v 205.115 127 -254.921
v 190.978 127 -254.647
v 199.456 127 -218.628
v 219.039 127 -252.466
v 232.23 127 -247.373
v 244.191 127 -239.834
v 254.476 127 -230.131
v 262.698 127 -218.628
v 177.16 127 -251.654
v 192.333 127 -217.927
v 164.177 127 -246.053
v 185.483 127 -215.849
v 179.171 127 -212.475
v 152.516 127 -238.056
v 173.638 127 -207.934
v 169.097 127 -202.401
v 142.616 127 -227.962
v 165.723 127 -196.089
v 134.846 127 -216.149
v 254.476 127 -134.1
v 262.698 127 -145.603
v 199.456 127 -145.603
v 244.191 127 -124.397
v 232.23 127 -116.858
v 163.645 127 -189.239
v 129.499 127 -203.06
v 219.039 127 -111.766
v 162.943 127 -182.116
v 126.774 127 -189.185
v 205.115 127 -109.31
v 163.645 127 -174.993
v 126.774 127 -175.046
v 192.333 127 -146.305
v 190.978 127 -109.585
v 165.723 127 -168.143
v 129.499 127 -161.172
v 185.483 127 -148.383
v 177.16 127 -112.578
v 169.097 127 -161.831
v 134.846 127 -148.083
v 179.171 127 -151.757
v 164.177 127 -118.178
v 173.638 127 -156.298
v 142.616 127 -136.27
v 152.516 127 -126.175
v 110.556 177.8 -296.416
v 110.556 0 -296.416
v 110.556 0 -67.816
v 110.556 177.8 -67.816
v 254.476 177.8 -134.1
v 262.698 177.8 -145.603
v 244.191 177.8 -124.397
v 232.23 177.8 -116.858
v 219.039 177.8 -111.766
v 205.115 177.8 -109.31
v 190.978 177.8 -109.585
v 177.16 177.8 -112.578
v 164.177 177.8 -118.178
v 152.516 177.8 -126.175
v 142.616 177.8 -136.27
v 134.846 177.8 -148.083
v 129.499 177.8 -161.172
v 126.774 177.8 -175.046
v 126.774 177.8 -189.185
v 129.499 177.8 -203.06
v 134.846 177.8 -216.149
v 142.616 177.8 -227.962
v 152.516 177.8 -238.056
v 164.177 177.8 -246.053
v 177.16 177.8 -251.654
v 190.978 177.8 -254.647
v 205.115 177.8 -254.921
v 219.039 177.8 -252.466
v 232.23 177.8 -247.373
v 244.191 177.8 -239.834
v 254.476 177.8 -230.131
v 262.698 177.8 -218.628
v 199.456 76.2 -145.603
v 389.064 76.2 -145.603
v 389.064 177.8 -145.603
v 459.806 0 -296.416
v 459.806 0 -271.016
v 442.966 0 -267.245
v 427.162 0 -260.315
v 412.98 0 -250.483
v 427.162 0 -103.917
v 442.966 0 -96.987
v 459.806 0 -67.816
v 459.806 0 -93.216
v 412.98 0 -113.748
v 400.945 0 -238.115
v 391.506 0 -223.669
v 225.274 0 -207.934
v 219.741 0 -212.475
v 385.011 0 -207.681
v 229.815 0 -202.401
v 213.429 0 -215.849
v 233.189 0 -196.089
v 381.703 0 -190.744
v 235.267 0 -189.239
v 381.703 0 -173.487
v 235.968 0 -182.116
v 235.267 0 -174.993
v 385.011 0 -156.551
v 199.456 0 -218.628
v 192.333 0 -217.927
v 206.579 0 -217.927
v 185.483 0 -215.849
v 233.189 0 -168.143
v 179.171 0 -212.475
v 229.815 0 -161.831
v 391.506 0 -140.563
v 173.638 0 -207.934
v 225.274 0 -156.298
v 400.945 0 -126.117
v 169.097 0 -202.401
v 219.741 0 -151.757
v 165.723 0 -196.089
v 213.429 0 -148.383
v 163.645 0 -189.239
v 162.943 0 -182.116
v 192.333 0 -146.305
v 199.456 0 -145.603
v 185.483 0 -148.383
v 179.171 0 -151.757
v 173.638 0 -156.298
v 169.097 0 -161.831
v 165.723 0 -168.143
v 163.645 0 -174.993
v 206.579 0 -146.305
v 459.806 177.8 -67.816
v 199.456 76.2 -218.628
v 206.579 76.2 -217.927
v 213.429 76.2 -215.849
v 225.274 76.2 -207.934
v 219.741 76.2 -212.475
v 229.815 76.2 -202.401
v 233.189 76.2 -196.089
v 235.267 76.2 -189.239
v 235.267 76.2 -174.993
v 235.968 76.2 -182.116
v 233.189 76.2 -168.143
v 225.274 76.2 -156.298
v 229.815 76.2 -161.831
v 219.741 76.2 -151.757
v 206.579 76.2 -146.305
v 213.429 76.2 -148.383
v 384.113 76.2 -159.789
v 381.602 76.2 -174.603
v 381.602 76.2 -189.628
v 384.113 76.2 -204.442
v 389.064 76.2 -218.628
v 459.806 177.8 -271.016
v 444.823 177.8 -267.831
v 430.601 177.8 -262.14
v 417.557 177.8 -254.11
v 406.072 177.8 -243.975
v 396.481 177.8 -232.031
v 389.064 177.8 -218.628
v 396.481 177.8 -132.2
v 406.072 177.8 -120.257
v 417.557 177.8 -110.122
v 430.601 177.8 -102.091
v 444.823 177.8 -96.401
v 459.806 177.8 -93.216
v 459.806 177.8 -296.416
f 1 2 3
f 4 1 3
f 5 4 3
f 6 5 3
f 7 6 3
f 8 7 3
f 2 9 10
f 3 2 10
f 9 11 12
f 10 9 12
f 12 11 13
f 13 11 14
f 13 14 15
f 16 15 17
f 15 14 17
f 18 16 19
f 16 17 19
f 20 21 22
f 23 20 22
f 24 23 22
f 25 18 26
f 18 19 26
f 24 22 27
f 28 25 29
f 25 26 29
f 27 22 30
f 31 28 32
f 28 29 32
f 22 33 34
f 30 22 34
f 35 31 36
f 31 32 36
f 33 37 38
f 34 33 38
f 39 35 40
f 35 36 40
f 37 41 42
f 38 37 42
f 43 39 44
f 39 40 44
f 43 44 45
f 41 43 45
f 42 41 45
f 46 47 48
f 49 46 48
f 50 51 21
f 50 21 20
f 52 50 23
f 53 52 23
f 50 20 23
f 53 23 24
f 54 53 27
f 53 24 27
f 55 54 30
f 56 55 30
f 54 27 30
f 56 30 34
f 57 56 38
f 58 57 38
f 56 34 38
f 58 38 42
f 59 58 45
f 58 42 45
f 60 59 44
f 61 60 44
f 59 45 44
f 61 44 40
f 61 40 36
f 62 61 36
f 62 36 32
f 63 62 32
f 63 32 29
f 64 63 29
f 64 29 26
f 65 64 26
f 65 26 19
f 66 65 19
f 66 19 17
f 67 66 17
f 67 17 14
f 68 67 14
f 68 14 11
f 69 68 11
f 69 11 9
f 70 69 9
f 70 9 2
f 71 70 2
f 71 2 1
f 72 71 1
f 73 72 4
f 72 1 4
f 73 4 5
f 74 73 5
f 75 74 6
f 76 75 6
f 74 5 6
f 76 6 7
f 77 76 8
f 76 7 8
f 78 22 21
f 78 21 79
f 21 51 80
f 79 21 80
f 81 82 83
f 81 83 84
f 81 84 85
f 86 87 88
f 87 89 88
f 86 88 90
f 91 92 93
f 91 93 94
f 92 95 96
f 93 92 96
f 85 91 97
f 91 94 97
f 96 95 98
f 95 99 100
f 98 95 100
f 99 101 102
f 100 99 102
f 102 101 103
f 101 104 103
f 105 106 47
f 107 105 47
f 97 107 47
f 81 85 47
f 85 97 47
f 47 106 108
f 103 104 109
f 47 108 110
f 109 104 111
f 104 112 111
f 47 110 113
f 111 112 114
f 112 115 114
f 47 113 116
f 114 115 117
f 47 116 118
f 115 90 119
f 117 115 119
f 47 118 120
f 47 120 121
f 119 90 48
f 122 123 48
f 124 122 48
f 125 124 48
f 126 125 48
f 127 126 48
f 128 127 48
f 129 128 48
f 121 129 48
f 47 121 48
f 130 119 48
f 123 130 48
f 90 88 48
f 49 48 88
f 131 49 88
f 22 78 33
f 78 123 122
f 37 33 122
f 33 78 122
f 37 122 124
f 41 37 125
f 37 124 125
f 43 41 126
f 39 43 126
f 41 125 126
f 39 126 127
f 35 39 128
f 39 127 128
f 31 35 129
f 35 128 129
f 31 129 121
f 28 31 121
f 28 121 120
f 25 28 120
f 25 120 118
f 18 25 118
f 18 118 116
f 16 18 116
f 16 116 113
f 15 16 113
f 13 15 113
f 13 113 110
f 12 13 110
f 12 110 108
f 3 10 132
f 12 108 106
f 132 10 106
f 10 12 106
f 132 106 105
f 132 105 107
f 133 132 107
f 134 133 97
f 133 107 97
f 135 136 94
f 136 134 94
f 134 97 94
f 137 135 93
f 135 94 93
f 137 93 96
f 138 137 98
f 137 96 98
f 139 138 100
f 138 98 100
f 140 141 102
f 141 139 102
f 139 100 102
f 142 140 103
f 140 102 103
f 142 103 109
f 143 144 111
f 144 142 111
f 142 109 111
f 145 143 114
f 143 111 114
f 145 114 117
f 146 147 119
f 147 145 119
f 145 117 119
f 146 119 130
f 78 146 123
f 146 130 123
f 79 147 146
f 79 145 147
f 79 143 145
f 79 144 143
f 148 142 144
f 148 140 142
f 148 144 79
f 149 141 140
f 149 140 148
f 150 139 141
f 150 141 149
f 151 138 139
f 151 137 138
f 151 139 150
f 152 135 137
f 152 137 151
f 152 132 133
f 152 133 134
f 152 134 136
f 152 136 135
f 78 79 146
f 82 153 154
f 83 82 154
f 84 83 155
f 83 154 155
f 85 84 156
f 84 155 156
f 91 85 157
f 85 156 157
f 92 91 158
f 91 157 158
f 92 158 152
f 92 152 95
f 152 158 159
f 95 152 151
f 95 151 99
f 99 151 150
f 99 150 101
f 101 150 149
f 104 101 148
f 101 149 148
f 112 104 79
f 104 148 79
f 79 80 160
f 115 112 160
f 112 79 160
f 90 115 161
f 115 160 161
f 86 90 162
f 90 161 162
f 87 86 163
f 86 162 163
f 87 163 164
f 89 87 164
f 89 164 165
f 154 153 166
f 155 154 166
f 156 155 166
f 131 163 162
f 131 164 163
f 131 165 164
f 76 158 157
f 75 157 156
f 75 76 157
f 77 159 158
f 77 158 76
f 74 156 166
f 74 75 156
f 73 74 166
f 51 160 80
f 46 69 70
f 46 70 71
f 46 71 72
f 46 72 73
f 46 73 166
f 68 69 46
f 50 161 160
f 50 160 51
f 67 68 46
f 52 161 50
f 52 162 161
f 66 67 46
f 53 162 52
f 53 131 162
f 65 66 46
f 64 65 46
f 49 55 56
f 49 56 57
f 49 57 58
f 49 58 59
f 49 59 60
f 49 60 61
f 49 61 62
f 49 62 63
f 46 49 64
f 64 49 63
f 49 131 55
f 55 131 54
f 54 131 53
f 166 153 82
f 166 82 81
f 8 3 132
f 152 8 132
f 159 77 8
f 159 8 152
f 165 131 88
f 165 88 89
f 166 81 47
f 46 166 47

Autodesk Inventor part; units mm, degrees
ref_plane "YZ Plane" through (0, 0, 0) normal (1, 0, 0) x (0, 1, 0)
ref_plane "XZ Plane" through (0, 0, 0) normal (0, 1, 0) x (-1, 0, 0)
ref_plane "XY Plane" through (0, 0, 0) normal (0, 0, 1) x (1, 0, 0)
sketch "Sketch1" plane through (0, 0, 0) normal (0, 1, 0) x (-1, 0, 0)
  line L0 (-110.556, -67.8158) -> (-459.806, -67.8158)
  line L1 (-459.806, -67.8158) -> (-459.806, -296.4158)
  line L2 (-459.806, -296.4158) -> (-110.556, -296.4158)
  line L3 (-110.556, -296.4158) -> (-110.556, -67.8158)
  point P0 (0, 0)
  dimension "d0" = 349.25
  dimension "d1" = 228.6
extrude "Extrusion2" add sketch "Sketch1" along normal blind 177.8
sketch "Sketch2" plane through (0, 177.8, 0) normal (0, 1, 0) x (1, 0, 0)
  arc A0 (459.806, 271.0158) -> (459.806, 93.2158) centre (470.8722, 182.1158) ccw
  line L0 (459.806, 271.0158) -> (459.806, 93.2158)
  line L1 (459.806, 67.8158) -> (459.806, 296.4158) projected
  point P0 (0, 0)
extrude "Extrusion3" cut sketch "Sketch2" against normal through all
sketch "Sketch3" plane through (0, 177.8, 0) normal (0, 1, 0) x (1, 0, 0)
  line L0 (110.556, 296.4158) -> (110.556, 67.8158) projected
  line L1 (459.806, 296.4158) -> (110.556, 296.4158) projected
  point P0 (0, 0)
  point P1 (199.456, 182.1158)
hole "Hole3" at (199.456, 177.8, -182.1158) direction (0, -1, 0) diameter 146.05 depth 50.8
sketch "Sketch4" plane through (199.456, 127, -182.1158) normal (0, 1, 0) x (1, 0, 0)
  point P0 (-199.456, -182.1158)
  point P1 (0, 0)
hole "Hole5" at (199.456, 127, -182.1158) direction (0, -1, 0) diameter 73.025 end through all
sketch "Sketch5" plane through (0, 177.8, 0) normal (0, 1, 0) x (1, 0, 0)
  circle A0 centre (199.456, 182.1158) radius 36.5125 projected
  line L0 (199.456, 218.6283) -> (389.0644, 218.6283)
  arc A1 (459.806, 271.0158) -> (459.806, 93.2158) centre (470.8722, 182.1158) ccw projected
  line L1 (199.456, 145.6033) -> (389.0644, 145.6033)
  arc A2 (199.456, 145.6033) -> (199.456, 218.6283) centre (199.456, 182.1158) ccw
  arc A3 (389.0644, 218.6283) -> (389.0644, 145.6033) centre (470.8722, 182.1158) ccw
  point P0 (0, 0)
extrude "Extrusion5" cut sketch "Sketch5" against normal blind 101.6 contours A0 L0 A1 L1
properties part number "7.2 Part 2"
